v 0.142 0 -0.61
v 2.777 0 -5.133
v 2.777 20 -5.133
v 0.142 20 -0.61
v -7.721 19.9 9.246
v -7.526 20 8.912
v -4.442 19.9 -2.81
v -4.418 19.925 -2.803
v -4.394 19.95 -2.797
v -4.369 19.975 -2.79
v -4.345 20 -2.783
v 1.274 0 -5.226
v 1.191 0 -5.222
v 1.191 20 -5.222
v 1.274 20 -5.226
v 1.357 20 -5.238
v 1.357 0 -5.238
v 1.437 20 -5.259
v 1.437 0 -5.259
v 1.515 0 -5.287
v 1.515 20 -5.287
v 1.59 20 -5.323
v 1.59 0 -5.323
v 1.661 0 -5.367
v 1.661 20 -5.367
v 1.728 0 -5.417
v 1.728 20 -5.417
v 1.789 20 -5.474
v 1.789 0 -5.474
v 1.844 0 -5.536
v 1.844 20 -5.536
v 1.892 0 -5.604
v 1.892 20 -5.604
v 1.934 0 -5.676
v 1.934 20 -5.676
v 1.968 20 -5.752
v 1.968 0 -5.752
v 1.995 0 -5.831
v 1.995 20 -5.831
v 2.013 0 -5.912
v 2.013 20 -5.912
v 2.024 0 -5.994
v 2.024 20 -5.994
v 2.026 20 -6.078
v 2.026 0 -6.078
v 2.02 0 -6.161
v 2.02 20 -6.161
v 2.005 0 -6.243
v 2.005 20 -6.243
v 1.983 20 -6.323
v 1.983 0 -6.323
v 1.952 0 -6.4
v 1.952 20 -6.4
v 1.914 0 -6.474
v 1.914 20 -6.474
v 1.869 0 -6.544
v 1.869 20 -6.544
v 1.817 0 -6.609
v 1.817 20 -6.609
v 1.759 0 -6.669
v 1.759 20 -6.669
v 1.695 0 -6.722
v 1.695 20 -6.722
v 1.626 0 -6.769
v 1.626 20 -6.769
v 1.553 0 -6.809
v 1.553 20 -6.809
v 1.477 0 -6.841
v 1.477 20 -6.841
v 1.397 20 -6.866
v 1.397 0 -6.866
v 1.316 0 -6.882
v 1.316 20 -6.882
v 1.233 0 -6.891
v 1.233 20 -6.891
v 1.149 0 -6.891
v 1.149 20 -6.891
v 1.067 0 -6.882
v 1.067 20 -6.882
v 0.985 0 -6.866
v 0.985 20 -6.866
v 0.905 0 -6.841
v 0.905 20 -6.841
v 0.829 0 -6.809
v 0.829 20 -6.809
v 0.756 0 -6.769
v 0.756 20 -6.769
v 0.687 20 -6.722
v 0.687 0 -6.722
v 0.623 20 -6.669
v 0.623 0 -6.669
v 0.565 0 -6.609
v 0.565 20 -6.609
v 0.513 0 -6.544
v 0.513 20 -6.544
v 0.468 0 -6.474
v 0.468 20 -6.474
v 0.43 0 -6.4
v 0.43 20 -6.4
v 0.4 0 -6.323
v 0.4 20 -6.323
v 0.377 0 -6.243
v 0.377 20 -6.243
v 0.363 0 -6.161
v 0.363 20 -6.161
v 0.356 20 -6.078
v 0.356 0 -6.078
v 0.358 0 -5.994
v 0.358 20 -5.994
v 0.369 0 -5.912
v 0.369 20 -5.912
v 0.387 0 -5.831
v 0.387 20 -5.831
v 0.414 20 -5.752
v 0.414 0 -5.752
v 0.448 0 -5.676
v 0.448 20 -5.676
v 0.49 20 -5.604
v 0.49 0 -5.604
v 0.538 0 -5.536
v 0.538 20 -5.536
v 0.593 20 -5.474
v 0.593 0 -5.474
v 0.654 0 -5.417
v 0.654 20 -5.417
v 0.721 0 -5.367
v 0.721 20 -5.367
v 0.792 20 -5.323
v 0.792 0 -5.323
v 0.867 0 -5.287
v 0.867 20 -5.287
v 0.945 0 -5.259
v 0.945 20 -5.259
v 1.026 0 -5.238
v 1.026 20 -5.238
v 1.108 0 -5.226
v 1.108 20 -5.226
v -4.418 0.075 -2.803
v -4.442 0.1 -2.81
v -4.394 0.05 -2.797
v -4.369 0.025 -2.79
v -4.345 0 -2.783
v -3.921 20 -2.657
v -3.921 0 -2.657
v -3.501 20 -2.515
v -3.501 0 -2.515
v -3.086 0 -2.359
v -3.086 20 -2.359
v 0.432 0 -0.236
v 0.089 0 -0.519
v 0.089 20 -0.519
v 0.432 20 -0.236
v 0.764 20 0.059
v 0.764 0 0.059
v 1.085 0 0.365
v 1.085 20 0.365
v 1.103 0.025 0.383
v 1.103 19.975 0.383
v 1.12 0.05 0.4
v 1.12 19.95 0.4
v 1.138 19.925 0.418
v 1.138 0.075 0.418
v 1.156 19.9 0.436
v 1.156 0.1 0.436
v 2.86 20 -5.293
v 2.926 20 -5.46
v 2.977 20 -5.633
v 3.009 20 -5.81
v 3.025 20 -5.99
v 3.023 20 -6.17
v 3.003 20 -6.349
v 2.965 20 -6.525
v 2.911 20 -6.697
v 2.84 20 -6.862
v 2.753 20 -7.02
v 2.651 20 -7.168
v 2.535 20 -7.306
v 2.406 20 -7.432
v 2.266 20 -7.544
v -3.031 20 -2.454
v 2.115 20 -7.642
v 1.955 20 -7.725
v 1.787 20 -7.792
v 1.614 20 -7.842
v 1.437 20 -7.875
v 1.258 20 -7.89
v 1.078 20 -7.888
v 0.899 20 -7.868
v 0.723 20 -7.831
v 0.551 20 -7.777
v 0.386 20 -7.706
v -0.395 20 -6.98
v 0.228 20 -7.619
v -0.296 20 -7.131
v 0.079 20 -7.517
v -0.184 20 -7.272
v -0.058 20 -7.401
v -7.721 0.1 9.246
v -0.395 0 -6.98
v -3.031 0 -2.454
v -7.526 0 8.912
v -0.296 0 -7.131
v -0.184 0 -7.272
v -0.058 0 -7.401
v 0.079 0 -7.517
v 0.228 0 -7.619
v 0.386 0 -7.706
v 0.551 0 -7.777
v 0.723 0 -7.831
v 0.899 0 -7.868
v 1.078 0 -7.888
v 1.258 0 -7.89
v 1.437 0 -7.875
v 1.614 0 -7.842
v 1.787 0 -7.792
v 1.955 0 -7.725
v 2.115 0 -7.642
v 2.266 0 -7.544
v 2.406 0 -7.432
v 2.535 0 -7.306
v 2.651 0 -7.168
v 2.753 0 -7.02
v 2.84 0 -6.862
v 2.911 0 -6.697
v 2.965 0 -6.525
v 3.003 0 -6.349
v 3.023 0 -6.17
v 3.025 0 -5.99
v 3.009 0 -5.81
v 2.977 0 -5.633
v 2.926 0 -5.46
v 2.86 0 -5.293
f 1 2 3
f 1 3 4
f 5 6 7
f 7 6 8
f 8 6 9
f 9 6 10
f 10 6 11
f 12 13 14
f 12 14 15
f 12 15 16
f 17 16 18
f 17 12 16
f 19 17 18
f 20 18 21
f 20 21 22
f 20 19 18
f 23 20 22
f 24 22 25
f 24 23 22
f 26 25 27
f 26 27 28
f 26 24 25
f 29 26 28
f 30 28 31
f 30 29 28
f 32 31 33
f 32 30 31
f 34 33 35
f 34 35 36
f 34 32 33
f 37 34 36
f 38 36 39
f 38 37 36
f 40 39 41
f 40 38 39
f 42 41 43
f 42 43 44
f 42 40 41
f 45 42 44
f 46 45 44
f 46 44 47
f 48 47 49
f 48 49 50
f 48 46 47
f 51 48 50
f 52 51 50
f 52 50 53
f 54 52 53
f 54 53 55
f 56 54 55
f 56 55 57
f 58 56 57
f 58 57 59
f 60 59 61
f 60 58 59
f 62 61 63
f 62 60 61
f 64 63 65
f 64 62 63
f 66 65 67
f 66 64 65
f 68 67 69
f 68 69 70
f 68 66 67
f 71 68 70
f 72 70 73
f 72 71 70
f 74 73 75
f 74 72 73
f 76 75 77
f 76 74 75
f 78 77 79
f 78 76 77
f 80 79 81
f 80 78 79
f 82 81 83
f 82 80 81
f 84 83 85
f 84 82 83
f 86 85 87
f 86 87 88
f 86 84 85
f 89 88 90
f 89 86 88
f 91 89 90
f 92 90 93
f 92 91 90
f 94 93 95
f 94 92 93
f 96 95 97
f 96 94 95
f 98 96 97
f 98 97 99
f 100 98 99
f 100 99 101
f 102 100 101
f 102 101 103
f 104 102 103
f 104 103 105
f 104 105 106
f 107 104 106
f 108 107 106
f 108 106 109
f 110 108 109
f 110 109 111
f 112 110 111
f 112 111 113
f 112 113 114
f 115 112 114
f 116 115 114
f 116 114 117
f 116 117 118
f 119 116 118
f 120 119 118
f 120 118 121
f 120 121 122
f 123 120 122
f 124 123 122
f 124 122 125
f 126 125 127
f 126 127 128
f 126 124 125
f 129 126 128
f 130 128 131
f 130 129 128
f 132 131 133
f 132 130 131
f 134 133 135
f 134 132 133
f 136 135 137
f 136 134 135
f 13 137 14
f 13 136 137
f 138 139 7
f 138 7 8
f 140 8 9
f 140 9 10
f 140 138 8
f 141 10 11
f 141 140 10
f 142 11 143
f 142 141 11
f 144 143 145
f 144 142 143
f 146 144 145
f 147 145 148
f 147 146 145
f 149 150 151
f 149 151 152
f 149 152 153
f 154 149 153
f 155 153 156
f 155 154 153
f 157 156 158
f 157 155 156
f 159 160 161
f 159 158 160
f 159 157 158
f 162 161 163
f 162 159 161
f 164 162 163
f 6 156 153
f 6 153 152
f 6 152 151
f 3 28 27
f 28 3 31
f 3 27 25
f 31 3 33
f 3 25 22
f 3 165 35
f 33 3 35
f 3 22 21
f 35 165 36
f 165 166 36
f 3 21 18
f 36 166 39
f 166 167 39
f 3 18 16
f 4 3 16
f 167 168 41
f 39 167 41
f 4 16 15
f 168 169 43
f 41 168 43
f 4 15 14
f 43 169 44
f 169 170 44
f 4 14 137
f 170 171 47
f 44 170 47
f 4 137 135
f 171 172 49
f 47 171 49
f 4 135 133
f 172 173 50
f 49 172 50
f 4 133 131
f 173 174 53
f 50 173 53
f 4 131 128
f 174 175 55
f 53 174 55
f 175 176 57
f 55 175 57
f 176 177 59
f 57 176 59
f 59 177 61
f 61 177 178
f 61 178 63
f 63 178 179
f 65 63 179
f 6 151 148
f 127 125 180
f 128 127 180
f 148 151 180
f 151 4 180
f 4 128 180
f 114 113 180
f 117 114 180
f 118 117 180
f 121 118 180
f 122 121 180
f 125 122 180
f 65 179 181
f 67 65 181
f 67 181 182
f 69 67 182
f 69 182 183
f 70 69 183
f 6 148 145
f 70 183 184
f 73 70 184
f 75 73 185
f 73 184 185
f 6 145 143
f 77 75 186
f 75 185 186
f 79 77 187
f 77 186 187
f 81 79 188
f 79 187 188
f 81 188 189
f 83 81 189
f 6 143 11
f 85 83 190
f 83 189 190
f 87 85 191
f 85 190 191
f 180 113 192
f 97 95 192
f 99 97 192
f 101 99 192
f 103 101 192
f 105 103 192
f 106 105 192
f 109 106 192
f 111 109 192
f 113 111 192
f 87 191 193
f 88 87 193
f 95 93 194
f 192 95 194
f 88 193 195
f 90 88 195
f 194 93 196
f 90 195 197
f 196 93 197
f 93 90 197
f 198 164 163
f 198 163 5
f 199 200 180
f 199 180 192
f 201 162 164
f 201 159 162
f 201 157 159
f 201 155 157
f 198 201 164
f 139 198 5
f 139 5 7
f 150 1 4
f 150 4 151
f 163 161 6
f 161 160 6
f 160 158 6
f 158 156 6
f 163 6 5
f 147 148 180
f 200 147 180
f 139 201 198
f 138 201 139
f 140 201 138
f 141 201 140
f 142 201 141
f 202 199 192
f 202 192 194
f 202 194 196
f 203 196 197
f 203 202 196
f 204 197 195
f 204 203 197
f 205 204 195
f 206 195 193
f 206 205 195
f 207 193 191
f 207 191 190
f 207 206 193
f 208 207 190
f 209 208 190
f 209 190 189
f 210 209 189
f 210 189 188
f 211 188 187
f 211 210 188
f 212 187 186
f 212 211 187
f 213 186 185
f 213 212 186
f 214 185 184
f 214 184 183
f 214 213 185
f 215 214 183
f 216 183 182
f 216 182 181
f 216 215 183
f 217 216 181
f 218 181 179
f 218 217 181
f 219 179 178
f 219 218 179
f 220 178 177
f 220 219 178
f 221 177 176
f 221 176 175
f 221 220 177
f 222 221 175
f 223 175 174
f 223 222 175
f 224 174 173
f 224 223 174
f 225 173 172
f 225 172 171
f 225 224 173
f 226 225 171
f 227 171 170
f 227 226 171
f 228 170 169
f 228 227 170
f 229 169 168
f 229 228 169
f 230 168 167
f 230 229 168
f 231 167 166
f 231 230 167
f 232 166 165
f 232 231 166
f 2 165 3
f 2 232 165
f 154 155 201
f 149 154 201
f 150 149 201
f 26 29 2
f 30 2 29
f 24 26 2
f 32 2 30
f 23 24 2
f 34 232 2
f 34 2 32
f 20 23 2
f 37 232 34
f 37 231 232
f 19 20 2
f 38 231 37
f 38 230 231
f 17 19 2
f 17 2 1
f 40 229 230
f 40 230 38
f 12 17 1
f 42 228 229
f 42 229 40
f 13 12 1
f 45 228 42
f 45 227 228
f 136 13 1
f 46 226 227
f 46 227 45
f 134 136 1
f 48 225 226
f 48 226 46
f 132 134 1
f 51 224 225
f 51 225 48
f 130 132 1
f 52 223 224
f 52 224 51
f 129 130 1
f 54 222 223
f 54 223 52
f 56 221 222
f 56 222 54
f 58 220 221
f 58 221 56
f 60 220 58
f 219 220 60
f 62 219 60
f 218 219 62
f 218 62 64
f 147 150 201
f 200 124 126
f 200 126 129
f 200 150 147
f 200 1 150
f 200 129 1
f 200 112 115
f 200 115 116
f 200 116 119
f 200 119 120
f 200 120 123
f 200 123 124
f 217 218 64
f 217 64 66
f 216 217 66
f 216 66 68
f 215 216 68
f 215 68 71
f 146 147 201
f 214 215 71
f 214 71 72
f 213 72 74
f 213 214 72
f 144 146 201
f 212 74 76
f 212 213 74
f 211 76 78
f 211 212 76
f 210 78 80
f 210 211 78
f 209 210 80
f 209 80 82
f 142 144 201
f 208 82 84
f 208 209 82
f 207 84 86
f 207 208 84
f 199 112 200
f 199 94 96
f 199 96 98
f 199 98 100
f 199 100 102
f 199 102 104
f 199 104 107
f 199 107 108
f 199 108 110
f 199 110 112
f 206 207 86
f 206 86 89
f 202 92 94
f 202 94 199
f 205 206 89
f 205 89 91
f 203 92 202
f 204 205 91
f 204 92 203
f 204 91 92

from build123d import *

# Parameters (mm, degrees)
SKETCH1_R           = 0.835
BOSS_EXTRUDE1_DEPTH = 20
CHAMFER1_SIZE       = 0.1


with BuildPart() as part:
    # Sketch1 → Boss-Extrude1 (new body)
    with BuildSketch(Plane(origin=(0, 0, 0), x_dir=(1, 0, 0), z_dir=(0, 1, 0))):
        with BuildLine():
            Line((2.776760362, 5.133225937), (0.142399779, 0.609778229))
            Line((0.142399779, 0.609778229), (0.0893221, 0.518638806))
            ThreePointArc((0.0893221, 0.518638806), (0.636251586, 0.056736494), (1.155841613, -0.435718389))
            Line((1.155841613, -0.435718389), (-7.720764547, -9.245763982))
            Line((-7.720764547, -9.245763982), (-4.441814223, 2.809787769))
            ThreePointArc((-4.441814223, 2.809787769), (-3.757359805, 2.60387674), (-3.085793629, 2.359180862))
            Line((-3.085793629, 2.359180862), (-3.030668296, 2.453836303))
            Line((-3.030668296, 2.453836303), (-0.394624771, 6.980173781))
            ThreePointArc((-0.394624771, 6.980173781), (2.114541718, 7.642392425), (2.776760362, 5.133225937))
        make_face()
        with Locations(Location((1.191067796, 6.056699859, 0), (0, 0, 270))):
            Circle(SKETCH1_R, mode=Mode.SUBTRACT)
    extrude(amount=BOSS_EXTRUDE1_DEPTH)

    # Chamfer1
    chamfer1_edges = [part.edges().sort_by_distance(p)[0] for p in [
        (-3.282461467, 20, 4.840741186),
        (-3.282461467, 0, 4.840741186),
        (-6.081289385, 20, 3.217988107),
        (-6.081289385, 0, 3.217988107),
    ]]
    chamfer(chamfer1_edges, length=CHAMFER1_SIZE)


solid = part.part
